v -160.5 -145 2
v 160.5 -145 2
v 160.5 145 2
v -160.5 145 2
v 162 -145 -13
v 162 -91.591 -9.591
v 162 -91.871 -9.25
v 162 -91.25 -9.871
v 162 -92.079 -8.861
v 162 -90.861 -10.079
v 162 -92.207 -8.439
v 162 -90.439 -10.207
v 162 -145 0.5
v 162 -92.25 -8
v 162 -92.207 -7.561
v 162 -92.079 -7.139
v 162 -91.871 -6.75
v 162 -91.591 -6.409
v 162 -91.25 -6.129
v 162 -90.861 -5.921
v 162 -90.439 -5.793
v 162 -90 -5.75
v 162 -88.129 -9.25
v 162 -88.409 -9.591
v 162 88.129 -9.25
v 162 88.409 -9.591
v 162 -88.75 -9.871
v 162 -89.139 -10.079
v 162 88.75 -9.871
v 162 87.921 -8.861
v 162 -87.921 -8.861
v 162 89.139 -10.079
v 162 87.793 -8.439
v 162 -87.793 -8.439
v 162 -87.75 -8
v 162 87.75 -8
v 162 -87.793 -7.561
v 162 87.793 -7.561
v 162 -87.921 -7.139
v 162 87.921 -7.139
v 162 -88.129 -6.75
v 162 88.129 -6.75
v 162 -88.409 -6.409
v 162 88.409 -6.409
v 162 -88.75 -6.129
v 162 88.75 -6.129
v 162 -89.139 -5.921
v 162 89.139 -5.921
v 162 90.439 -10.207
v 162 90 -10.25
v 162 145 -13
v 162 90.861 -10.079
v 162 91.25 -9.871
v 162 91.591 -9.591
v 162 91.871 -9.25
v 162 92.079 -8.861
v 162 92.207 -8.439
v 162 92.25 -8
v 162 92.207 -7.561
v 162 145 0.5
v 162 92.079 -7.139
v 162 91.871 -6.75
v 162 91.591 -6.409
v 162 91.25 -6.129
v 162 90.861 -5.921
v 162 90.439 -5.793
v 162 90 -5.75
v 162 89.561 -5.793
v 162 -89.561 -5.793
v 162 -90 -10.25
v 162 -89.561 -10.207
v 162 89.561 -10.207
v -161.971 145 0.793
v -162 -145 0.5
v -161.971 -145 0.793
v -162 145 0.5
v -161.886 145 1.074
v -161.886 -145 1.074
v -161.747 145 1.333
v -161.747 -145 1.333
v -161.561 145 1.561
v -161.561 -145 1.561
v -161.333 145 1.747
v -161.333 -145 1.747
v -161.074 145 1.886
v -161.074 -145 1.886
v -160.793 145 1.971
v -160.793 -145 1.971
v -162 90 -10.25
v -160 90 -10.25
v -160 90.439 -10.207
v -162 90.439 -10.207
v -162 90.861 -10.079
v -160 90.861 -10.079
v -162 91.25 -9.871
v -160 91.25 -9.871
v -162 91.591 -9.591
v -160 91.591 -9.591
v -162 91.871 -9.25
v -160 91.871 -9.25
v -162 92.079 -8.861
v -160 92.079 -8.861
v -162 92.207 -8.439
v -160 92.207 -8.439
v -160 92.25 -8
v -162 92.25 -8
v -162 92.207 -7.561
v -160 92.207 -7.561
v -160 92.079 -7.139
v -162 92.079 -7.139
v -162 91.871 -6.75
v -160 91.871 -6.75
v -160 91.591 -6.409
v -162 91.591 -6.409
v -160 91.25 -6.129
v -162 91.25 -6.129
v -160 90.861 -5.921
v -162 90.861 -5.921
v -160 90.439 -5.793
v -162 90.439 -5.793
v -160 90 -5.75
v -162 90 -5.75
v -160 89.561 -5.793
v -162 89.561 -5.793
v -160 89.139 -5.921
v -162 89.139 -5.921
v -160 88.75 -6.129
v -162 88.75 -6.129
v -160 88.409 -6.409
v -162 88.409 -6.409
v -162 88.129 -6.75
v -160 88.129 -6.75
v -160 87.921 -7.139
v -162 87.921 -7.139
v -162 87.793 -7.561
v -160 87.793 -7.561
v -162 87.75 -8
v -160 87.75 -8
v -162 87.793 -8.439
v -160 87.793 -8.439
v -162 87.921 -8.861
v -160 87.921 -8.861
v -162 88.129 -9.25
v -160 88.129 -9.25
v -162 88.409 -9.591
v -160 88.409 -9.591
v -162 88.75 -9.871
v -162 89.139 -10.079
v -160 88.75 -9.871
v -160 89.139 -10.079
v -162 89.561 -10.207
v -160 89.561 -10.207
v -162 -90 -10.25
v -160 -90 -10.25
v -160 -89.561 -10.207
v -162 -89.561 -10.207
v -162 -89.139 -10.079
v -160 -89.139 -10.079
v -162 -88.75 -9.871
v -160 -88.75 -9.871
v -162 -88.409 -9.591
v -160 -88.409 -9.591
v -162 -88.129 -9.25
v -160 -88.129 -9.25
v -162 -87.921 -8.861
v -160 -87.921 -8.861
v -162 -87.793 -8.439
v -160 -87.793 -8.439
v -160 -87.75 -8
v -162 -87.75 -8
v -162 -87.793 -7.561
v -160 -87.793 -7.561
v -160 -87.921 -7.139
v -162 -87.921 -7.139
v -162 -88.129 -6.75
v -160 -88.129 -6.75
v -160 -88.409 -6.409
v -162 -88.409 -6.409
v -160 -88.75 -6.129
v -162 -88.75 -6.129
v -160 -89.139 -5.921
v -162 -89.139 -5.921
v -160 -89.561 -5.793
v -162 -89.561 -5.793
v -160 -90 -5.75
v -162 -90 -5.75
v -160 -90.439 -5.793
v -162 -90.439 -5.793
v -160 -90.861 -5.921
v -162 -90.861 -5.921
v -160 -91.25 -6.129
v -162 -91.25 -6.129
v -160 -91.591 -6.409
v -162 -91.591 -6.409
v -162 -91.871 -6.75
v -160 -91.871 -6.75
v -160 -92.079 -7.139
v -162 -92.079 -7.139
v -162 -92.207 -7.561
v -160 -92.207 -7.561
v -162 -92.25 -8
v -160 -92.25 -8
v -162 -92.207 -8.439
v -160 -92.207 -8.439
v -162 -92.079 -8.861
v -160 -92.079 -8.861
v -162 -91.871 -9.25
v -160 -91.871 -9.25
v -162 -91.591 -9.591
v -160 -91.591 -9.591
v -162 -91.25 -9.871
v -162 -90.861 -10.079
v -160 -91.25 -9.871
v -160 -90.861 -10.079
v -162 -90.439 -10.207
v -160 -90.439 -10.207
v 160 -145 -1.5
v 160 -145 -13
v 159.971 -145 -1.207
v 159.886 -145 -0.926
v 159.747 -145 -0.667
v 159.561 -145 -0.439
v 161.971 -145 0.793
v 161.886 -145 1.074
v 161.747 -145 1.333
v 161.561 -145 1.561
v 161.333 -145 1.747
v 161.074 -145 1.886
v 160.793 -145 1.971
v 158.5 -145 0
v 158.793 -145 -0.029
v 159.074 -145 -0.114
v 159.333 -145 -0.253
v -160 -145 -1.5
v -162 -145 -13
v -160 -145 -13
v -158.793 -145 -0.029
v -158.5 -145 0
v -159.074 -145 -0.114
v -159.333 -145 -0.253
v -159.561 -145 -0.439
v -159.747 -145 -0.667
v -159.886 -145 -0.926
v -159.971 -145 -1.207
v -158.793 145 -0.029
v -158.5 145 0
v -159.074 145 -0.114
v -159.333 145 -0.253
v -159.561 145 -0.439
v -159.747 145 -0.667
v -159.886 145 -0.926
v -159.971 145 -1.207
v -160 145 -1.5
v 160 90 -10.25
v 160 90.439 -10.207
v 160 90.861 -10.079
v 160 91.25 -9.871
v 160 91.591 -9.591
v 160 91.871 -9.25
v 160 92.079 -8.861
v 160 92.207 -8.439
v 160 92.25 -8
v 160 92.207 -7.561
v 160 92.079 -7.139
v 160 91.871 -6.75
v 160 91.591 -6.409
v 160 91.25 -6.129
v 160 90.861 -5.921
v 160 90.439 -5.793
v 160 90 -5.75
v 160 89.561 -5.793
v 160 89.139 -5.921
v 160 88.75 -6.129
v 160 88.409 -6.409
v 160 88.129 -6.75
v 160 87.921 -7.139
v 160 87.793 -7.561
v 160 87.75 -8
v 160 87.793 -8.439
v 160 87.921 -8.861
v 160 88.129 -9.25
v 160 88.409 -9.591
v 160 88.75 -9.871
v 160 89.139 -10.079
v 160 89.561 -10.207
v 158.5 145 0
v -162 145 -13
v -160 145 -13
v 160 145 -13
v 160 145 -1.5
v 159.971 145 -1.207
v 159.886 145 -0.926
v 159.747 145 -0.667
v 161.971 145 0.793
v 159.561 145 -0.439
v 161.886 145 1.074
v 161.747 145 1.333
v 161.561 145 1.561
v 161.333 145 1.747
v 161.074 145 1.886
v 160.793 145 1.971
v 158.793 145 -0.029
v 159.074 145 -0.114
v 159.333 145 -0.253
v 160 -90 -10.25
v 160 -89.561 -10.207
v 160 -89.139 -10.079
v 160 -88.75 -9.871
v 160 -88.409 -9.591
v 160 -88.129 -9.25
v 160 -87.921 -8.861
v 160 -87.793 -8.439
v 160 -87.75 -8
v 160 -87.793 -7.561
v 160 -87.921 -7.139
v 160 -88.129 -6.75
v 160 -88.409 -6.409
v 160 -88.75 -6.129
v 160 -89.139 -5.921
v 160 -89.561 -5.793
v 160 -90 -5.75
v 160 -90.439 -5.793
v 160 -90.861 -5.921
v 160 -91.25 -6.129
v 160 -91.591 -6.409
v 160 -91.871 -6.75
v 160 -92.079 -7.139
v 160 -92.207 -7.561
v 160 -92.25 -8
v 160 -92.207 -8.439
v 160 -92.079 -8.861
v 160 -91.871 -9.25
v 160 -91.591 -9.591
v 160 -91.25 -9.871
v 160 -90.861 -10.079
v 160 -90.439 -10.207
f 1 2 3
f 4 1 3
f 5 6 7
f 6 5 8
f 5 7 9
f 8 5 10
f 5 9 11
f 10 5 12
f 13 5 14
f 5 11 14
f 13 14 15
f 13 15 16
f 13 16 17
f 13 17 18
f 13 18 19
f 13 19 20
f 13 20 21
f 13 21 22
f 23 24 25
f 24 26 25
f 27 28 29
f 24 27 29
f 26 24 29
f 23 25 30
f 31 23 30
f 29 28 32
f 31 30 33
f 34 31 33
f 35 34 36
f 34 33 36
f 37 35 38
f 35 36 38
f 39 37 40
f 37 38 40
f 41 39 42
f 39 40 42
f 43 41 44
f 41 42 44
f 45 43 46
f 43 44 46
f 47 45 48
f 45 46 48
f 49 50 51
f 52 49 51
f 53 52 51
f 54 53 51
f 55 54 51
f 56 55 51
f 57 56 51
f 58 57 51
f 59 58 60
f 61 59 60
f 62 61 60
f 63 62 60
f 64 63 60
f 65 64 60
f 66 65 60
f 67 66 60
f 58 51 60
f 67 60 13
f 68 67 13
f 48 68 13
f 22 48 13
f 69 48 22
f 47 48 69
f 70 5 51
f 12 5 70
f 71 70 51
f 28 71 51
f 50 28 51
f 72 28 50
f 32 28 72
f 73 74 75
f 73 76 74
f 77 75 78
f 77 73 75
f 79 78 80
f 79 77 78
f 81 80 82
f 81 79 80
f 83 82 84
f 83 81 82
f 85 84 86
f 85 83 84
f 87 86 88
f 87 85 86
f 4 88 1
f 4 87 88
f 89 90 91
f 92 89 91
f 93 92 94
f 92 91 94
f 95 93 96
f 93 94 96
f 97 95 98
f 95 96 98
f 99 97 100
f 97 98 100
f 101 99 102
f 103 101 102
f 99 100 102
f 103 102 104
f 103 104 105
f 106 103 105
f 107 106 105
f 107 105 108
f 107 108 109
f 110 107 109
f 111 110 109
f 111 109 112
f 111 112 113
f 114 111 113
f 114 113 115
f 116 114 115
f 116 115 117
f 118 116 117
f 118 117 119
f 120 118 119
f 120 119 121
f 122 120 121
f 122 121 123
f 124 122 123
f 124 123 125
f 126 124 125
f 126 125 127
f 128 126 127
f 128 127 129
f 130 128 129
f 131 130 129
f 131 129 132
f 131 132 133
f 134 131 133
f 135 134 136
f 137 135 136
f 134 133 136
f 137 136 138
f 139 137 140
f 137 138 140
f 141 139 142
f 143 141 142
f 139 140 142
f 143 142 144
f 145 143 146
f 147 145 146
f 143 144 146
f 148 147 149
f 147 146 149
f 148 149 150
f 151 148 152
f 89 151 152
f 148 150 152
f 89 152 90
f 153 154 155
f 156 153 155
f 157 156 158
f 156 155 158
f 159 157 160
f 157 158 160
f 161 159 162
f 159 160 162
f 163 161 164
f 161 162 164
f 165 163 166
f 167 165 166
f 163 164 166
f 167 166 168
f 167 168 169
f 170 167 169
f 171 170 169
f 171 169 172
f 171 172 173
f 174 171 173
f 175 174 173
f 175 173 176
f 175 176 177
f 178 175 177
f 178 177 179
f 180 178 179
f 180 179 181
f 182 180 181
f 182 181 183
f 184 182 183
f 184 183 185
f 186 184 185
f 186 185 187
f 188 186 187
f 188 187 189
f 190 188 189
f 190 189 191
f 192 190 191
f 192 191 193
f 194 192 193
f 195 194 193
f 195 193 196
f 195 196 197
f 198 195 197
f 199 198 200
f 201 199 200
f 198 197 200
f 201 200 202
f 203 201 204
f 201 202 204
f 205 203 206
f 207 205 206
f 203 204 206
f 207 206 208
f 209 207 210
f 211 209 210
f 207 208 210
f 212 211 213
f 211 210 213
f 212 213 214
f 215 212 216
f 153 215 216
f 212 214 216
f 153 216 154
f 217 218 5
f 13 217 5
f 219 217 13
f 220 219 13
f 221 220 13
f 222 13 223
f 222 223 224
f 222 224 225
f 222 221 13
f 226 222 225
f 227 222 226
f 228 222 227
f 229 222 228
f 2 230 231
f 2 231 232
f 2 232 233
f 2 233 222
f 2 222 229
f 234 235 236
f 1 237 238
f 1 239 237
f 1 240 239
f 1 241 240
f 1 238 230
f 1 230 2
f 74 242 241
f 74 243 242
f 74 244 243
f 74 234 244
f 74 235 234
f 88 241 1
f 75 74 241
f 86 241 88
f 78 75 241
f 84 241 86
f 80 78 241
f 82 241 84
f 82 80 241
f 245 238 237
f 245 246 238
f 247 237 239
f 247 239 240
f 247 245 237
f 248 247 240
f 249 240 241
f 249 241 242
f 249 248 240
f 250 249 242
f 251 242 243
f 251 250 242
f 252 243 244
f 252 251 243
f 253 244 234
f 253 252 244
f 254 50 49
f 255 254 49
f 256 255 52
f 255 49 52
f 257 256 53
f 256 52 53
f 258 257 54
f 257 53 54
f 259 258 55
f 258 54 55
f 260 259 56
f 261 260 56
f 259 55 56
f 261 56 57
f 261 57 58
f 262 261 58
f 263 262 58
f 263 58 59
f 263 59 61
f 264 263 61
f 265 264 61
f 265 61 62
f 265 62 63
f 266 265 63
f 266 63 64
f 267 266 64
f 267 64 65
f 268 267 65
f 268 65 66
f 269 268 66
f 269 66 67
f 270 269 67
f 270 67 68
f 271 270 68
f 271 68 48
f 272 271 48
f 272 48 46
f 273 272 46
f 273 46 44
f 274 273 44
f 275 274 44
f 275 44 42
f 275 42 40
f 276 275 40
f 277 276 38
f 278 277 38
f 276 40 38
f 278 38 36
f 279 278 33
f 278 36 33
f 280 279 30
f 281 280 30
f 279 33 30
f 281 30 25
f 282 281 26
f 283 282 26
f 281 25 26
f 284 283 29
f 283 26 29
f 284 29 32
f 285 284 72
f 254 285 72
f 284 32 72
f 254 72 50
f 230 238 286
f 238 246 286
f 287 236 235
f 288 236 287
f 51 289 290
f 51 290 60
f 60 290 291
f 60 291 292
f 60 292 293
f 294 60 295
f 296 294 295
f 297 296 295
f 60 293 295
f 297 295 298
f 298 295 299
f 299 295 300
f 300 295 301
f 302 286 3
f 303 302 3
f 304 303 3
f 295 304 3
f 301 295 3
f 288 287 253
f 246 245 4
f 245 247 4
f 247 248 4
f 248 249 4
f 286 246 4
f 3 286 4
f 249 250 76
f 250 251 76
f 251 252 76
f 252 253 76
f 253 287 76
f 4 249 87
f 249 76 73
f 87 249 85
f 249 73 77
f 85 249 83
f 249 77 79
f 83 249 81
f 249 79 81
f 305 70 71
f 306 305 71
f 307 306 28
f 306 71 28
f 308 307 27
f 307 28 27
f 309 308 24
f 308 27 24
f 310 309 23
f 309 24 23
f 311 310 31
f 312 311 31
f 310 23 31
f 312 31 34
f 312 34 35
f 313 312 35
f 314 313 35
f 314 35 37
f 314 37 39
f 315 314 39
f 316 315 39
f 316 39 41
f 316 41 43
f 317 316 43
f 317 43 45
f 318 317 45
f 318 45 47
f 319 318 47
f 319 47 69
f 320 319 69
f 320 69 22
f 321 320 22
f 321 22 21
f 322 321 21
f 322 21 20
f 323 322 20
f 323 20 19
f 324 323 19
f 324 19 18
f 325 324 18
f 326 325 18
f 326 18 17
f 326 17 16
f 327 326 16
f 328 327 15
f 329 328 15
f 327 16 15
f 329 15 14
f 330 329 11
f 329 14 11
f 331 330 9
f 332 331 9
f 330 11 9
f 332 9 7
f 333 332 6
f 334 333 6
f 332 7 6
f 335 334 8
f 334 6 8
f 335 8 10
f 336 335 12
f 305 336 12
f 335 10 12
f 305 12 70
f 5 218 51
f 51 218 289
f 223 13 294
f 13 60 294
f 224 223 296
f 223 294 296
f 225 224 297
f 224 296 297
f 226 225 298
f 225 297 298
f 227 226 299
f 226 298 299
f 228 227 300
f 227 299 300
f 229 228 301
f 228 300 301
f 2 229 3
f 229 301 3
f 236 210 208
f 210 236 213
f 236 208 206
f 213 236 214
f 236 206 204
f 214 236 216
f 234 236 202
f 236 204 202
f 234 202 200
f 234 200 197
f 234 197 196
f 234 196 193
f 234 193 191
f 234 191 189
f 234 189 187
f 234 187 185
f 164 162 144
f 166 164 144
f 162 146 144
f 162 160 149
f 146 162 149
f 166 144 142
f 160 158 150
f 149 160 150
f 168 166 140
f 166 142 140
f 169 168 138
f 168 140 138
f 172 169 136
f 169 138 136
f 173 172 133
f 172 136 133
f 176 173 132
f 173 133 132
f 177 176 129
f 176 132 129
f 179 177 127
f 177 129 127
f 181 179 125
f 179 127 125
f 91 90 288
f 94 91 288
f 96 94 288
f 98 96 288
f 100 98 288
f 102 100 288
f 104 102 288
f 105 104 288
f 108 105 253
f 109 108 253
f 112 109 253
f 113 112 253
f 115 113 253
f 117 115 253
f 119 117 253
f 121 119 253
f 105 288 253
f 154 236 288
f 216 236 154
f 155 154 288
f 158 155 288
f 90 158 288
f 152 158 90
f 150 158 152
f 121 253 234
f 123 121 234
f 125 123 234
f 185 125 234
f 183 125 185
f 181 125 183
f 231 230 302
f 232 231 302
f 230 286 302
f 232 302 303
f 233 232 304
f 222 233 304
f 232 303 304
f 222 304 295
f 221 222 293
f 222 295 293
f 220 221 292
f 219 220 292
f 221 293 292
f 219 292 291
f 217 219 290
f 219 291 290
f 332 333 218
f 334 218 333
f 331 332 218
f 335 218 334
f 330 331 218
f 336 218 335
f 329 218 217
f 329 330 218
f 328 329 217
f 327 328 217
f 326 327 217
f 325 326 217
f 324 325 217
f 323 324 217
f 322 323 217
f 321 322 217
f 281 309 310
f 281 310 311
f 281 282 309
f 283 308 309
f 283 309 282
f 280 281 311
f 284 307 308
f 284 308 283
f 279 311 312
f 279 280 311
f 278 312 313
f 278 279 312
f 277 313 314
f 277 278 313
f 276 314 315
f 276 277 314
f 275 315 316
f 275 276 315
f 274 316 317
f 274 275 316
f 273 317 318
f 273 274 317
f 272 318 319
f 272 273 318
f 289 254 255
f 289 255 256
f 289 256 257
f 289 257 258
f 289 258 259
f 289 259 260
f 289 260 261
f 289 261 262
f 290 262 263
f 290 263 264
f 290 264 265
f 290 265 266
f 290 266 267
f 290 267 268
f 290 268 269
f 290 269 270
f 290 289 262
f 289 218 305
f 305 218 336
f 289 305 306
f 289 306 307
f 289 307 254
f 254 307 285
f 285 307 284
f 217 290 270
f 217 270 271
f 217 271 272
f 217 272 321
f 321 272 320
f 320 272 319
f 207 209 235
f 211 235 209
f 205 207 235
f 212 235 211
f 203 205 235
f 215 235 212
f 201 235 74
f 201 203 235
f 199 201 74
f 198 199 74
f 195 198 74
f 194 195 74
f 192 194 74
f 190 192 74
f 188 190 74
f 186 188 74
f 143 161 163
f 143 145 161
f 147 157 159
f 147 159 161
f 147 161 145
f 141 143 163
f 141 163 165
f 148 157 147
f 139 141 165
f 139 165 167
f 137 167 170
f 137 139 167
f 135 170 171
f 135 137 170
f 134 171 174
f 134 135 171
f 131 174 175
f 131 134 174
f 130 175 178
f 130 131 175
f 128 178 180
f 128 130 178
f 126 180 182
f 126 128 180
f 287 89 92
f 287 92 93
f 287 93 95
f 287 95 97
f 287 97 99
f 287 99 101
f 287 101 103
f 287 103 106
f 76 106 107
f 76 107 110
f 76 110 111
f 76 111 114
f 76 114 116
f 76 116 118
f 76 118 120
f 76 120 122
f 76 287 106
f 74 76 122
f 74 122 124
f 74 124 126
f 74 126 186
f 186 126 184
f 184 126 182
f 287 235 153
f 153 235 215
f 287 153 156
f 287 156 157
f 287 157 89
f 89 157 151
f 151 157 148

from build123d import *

# Parameters (mm, degrees)
ESQUISSE1_W           = 320
ESQUISSE1_H           = 290
BOSS_EXTRU_1_DEPTH    = 2
ESQUISSE2_W           = 15
ESQUISSE2_H           = 290
BOSS_EXTRU_2_DEPTH    = 2
CONG_1_R              = 1.5
CONG_1_OF_SYM_TRIE1_R = 1.5
D_GAGEMENT_M41_D      = 4.5


with BuildPart() as part:
    # Esquisse1 → Boss.-Extru.1 (new body)
    with BuildSketch(Plane.XY):
        Rectangle(ESQUISSE1_W, ESQUISSE1_H)
    extrude(amount=BOSS_EXTRU_1_DEPTH)

    # Esquisse2 → Boss.-Extru.2 (add)
    with BuildSketch(Plane.ZY.offset(160)):
        with Locations((-5.5, 0)):
            Rectangle(ESQUISSE2_W, ESQUISSE2_H)
    boss_extru_2 = extrude(amount=BOSS_EXTRU_2_DEPTH)

    # Congé1
    cong_1_edges = [part.edges().sort_by_distance(p)[0] for p in [
        (-160, 0, 0),
        (-162, 0, 2),
    ]]
    fillet(cong_1_edges, radius=CONG_1_R)

    # Symétrie1: Boss.-Extru.2 across plane
    add(boss_extru_2.mirror(Plane(origin=(0, 0, 0), x_dir=(0, 0, 1), z_dir=(1, 0, 0))))

    # Congé1 of Symétrie1
    cong_1_of_sym_trie1_edges = [part.edges().sort_by_distance(p)[0] for p in [
        (160, 0, 0),
        (162, 0, 2),
    ]]
    fillet(cong_1_of_sym_trie1_edges, radius=CONG_1_OF_SYM_TRIE1_R)

    # Dégagement M41 (through all)
    with Locations(Plane.ZY.offset(162)):
        with Locations((-8, -90), (-8, 90)):
            Hole(D_GAGEMENT_M41_D / 2)


solid = part.part
